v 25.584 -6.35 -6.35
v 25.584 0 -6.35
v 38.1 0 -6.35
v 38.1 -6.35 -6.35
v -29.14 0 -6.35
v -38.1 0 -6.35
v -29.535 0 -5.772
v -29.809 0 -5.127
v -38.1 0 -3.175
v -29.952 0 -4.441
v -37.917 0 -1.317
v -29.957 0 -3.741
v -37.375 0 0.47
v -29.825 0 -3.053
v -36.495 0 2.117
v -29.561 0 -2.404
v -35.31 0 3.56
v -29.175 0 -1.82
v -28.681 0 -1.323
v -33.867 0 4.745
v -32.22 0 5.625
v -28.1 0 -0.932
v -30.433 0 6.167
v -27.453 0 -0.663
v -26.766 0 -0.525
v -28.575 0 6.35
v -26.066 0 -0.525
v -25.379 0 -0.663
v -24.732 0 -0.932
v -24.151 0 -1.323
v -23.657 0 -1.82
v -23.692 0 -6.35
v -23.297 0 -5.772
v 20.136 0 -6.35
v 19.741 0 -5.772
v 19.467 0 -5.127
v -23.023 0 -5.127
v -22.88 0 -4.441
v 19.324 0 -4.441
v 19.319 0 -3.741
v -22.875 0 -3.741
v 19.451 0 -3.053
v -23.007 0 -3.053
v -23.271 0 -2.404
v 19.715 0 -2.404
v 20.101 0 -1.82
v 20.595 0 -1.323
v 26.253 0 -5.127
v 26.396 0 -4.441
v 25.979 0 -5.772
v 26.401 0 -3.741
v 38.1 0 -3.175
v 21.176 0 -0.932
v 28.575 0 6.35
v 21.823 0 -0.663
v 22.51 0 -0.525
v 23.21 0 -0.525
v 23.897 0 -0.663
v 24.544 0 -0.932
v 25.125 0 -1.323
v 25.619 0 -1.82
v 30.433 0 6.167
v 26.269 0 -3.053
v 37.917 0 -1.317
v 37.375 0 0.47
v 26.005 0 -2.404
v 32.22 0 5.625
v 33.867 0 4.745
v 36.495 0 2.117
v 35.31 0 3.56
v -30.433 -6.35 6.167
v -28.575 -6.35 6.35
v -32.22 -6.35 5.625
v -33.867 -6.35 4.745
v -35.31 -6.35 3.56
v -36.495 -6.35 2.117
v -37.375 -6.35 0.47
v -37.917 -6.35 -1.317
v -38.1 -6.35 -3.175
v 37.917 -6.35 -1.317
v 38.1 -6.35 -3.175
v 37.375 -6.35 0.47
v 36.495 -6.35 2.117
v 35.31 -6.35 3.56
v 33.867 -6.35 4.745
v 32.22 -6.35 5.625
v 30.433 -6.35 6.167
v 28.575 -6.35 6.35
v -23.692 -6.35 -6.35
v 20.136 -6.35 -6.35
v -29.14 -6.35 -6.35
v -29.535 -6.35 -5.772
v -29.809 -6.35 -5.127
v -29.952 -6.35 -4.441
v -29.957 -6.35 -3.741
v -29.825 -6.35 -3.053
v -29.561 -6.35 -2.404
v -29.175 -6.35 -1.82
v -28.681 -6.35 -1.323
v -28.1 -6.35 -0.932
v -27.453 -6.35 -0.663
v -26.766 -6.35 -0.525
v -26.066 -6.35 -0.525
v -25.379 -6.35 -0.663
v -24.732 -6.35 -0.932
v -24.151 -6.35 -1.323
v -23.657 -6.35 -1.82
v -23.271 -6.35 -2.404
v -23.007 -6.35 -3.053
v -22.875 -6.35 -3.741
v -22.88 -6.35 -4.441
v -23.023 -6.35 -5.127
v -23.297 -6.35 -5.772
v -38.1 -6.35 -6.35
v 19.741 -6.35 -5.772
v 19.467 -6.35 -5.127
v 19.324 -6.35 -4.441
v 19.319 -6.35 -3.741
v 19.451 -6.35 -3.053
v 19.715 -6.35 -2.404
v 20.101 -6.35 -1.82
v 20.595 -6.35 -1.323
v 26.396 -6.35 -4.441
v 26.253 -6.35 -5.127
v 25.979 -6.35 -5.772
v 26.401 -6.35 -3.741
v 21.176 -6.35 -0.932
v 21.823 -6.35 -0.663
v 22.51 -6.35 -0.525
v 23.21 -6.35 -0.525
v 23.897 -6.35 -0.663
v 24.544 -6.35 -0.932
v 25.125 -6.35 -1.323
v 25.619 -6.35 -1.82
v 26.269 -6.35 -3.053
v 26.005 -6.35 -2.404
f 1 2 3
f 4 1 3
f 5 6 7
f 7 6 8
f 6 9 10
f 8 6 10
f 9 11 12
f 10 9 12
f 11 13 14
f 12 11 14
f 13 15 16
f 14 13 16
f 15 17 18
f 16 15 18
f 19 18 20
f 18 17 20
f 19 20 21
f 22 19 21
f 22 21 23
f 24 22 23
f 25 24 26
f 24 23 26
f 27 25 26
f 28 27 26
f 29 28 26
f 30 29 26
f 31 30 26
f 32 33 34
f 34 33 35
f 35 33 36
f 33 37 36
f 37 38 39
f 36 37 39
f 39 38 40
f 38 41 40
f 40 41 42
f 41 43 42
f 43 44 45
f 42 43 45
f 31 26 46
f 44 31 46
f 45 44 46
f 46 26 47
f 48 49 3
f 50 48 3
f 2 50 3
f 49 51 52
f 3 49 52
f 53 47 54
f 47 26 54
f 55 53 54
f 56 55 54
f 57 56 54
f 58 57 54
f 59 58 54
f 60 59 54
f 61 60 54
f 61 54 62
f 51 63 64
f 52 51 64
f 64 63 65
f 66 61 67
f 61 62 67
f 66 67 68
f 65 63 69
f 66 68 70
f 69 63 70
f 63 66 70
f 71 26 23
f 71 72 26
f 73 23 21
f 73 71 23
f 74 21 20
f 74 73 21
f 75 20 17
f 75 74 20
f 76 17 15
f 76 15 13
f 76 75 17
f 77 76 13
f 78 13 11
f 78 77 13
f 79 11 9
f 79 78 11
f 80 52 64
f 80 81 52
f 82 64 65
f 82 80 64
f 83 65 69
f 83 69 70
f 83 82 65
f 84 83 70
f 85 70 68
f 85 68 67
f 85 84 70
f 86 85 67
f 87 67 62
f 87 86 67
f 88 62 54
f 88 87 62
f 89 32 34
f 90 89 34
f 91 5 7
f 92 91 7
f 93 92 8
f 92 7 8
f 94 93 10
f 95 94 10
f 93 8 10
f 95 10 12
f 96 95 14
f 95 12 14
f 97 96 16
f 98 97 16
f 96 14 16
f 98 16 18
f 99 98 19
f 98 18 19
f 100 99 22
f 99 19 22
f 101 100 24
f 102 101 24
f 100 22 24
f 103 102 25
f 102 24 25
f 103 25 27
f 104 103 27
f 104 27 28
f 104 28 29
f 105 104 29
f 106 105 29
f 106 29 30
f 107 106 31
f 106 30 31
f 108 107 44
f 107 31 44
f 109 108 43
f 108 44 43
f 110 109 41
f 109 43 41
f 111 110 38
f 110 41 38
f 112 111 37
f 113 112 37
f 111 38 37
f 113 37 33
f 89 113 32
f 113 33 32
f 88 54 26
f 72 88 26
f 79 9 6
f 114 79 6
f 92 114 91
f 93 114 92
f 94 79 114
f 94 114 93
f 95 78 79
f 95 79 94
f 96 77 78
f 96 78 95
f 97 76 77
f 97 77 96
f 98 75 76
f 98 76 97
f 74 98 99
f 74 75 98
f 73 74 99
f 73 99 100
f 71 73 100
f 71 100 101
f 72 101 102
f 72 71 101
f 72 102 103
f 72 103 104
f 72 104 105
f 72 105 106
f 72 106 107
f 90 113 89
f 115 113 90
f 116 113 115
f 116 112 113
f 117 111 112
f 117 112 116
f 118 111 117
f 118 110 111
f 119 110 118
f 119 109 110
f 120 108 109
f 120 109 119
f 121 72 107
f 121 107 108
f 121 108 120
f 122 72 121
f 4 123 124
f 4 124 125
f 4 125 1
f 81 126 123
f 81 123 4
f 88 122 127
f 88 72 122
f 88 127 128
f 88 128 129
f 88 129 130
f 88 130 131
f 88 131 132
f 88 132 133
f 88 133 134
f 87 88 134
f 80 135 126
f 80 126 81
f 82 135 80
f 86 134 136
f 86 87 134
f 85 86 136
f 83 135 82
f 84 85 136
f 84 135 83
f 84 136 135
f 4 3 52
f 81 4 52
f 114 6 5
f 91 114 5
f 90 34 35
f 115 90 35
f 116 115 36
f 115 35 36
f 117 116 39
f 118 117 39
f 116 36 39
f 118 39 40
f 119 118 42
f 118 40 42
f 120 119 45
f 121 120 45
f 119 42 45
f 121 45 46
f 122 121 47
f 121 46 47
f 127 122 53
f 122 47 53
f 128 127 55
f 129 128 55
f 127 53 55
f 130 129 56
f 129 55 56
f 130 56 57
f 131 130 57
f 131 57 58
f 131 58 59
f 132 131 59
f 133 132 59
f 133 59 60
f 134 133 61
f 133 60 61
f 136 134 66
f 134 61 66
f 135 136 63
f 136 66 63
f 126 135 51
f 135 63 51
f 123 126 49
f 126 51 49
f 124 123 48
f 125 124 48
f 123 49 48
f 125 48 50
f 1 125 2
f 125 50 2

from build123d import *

# Parameters (mm, degrees)
F1_DEPTH = 6.35
F2_R     = 9.525


with BuildPart() as f1:
    # F0 (on Front) → F1 (new body)
    with BuildSketch(Plane.XZ):
        with BuildLine():
            Line((25.583847, -6.35), (38.1, -6.35))
            Line((38.1, -6.35), (38.1, 6.35))
            Line((38.1, 6.35), (-38.1, 6.35))
            Line((-38.1, 6.35), (-38.1, -6.35))
            Line((-38.1, -6.35), (-29.139847, -6.35))
            ThreePointArc((-29.139847, -6.35), (-26.416, -0.508), (-23.692153, -6.35))
            Line((-23.692153, -6.35), (20.136153, -6.35))
            ThreePointArc((20.136153, -6.35), (22.86, -0.508), (25.583847, -6.35))
        make_face()
    extrude(amount=F1_DEPTH)

    # F2
    f2_edges = [f1.edges().sort_by_distance(p)[0] for p in [
        (-38.1, -3.175, 6.35),
        (38.1, -3.175, 6.35),
    ]]
    fillet(f2_edges, radius=F2_R)


solid = f1.part
